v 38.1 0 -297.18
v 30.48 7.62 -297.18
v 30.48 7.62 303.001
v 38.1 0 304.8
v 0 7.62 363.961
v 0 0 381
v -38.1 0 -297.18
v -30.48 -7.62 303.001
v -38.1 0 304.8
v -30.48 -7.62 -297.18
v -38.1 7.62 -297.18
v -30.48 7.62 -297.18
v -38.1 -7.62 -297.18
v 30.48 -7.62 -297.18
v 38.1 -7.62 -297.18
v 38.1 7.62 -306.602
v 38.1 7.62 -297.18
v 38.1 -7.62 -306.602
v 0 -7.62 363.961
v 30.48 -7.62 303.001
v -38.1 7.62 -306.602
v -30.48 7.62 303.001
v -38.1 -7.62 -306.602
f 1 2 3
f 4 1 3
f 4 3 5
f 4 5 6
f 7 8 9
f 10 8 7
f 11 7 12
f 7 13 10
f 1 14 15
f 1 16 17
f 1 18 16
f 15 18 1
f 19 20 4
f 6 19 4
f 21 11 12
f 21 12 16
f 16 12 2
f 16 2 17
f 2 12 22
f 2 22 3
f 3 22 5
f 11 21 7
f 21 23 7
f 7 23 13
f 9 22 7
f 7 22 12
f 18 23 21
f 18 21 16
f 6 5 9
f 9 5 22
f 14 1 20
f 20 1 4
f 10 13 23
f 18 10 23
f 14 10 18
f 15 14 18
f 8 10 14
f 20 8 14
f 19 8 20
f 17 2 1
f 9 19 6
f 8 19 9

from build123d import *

# Parameters (mm, degrees)
F0_W     = 76.2
F0_H     = 304.8
F1_DEPTH = 7.62
F2_SIZE  = 7.61999
F3_W     = 76.2
F3_H     = 9.4219583702
F4_DEPTH = 15.24


# Not quite as in the source:
# - a fillet or chamfer is up to 0.001 mm smaller than in the source, because OpenCascade refuses the exact size


with BuildPart() as f1:
    # F0 (on Front) → F1 (new body, symmetric)
    with BuildSketch(Plane.XZ):
        with Locations((0, -152.4)):
            Rectangle(F0_W, F0_H)
        with Locations((0, 152.4)):
            Rectangle(F0_W, F0_H)
        Polygon((-38.1, 304.8), (38.1, 304.8), (0, 381), align=None)
    extrude(amount=F1_DEPTH, both=True)

    # F2 (size 7.62 in the source; OpenCascade refuses exactly that, so slightly less here)
    f2_edges = [f1.edges().sort_by_distance(p)[0] for p in [
        (0, -7.62, -304.8),
        (38.1, -7.62, 0),
        (19.05, -7.62, 342.9),
        (-19.05, -7.62, 342.9),
        (-38.1, -7.62, 0),
        (0, 7.62, -304.8),
        (38.1, 7.62, 0),
        (19.05, 7.62, 342.9),
        (-19.05, 7.62, 342.9),
        (-38.1, 7.62, 0),
    ]]
    chamfer(f2_edges, length=F2_SIZE)

    # F3 (on face) → F4 (join)
    with BuildSketch(Plane.XZ.offset(7.62)):
        with Locations((0, -301.8909791851)):
            Rectangle(F3_W, F3_H)
    extrude(amount=-F4_DEPTH)


solid = f1.part
